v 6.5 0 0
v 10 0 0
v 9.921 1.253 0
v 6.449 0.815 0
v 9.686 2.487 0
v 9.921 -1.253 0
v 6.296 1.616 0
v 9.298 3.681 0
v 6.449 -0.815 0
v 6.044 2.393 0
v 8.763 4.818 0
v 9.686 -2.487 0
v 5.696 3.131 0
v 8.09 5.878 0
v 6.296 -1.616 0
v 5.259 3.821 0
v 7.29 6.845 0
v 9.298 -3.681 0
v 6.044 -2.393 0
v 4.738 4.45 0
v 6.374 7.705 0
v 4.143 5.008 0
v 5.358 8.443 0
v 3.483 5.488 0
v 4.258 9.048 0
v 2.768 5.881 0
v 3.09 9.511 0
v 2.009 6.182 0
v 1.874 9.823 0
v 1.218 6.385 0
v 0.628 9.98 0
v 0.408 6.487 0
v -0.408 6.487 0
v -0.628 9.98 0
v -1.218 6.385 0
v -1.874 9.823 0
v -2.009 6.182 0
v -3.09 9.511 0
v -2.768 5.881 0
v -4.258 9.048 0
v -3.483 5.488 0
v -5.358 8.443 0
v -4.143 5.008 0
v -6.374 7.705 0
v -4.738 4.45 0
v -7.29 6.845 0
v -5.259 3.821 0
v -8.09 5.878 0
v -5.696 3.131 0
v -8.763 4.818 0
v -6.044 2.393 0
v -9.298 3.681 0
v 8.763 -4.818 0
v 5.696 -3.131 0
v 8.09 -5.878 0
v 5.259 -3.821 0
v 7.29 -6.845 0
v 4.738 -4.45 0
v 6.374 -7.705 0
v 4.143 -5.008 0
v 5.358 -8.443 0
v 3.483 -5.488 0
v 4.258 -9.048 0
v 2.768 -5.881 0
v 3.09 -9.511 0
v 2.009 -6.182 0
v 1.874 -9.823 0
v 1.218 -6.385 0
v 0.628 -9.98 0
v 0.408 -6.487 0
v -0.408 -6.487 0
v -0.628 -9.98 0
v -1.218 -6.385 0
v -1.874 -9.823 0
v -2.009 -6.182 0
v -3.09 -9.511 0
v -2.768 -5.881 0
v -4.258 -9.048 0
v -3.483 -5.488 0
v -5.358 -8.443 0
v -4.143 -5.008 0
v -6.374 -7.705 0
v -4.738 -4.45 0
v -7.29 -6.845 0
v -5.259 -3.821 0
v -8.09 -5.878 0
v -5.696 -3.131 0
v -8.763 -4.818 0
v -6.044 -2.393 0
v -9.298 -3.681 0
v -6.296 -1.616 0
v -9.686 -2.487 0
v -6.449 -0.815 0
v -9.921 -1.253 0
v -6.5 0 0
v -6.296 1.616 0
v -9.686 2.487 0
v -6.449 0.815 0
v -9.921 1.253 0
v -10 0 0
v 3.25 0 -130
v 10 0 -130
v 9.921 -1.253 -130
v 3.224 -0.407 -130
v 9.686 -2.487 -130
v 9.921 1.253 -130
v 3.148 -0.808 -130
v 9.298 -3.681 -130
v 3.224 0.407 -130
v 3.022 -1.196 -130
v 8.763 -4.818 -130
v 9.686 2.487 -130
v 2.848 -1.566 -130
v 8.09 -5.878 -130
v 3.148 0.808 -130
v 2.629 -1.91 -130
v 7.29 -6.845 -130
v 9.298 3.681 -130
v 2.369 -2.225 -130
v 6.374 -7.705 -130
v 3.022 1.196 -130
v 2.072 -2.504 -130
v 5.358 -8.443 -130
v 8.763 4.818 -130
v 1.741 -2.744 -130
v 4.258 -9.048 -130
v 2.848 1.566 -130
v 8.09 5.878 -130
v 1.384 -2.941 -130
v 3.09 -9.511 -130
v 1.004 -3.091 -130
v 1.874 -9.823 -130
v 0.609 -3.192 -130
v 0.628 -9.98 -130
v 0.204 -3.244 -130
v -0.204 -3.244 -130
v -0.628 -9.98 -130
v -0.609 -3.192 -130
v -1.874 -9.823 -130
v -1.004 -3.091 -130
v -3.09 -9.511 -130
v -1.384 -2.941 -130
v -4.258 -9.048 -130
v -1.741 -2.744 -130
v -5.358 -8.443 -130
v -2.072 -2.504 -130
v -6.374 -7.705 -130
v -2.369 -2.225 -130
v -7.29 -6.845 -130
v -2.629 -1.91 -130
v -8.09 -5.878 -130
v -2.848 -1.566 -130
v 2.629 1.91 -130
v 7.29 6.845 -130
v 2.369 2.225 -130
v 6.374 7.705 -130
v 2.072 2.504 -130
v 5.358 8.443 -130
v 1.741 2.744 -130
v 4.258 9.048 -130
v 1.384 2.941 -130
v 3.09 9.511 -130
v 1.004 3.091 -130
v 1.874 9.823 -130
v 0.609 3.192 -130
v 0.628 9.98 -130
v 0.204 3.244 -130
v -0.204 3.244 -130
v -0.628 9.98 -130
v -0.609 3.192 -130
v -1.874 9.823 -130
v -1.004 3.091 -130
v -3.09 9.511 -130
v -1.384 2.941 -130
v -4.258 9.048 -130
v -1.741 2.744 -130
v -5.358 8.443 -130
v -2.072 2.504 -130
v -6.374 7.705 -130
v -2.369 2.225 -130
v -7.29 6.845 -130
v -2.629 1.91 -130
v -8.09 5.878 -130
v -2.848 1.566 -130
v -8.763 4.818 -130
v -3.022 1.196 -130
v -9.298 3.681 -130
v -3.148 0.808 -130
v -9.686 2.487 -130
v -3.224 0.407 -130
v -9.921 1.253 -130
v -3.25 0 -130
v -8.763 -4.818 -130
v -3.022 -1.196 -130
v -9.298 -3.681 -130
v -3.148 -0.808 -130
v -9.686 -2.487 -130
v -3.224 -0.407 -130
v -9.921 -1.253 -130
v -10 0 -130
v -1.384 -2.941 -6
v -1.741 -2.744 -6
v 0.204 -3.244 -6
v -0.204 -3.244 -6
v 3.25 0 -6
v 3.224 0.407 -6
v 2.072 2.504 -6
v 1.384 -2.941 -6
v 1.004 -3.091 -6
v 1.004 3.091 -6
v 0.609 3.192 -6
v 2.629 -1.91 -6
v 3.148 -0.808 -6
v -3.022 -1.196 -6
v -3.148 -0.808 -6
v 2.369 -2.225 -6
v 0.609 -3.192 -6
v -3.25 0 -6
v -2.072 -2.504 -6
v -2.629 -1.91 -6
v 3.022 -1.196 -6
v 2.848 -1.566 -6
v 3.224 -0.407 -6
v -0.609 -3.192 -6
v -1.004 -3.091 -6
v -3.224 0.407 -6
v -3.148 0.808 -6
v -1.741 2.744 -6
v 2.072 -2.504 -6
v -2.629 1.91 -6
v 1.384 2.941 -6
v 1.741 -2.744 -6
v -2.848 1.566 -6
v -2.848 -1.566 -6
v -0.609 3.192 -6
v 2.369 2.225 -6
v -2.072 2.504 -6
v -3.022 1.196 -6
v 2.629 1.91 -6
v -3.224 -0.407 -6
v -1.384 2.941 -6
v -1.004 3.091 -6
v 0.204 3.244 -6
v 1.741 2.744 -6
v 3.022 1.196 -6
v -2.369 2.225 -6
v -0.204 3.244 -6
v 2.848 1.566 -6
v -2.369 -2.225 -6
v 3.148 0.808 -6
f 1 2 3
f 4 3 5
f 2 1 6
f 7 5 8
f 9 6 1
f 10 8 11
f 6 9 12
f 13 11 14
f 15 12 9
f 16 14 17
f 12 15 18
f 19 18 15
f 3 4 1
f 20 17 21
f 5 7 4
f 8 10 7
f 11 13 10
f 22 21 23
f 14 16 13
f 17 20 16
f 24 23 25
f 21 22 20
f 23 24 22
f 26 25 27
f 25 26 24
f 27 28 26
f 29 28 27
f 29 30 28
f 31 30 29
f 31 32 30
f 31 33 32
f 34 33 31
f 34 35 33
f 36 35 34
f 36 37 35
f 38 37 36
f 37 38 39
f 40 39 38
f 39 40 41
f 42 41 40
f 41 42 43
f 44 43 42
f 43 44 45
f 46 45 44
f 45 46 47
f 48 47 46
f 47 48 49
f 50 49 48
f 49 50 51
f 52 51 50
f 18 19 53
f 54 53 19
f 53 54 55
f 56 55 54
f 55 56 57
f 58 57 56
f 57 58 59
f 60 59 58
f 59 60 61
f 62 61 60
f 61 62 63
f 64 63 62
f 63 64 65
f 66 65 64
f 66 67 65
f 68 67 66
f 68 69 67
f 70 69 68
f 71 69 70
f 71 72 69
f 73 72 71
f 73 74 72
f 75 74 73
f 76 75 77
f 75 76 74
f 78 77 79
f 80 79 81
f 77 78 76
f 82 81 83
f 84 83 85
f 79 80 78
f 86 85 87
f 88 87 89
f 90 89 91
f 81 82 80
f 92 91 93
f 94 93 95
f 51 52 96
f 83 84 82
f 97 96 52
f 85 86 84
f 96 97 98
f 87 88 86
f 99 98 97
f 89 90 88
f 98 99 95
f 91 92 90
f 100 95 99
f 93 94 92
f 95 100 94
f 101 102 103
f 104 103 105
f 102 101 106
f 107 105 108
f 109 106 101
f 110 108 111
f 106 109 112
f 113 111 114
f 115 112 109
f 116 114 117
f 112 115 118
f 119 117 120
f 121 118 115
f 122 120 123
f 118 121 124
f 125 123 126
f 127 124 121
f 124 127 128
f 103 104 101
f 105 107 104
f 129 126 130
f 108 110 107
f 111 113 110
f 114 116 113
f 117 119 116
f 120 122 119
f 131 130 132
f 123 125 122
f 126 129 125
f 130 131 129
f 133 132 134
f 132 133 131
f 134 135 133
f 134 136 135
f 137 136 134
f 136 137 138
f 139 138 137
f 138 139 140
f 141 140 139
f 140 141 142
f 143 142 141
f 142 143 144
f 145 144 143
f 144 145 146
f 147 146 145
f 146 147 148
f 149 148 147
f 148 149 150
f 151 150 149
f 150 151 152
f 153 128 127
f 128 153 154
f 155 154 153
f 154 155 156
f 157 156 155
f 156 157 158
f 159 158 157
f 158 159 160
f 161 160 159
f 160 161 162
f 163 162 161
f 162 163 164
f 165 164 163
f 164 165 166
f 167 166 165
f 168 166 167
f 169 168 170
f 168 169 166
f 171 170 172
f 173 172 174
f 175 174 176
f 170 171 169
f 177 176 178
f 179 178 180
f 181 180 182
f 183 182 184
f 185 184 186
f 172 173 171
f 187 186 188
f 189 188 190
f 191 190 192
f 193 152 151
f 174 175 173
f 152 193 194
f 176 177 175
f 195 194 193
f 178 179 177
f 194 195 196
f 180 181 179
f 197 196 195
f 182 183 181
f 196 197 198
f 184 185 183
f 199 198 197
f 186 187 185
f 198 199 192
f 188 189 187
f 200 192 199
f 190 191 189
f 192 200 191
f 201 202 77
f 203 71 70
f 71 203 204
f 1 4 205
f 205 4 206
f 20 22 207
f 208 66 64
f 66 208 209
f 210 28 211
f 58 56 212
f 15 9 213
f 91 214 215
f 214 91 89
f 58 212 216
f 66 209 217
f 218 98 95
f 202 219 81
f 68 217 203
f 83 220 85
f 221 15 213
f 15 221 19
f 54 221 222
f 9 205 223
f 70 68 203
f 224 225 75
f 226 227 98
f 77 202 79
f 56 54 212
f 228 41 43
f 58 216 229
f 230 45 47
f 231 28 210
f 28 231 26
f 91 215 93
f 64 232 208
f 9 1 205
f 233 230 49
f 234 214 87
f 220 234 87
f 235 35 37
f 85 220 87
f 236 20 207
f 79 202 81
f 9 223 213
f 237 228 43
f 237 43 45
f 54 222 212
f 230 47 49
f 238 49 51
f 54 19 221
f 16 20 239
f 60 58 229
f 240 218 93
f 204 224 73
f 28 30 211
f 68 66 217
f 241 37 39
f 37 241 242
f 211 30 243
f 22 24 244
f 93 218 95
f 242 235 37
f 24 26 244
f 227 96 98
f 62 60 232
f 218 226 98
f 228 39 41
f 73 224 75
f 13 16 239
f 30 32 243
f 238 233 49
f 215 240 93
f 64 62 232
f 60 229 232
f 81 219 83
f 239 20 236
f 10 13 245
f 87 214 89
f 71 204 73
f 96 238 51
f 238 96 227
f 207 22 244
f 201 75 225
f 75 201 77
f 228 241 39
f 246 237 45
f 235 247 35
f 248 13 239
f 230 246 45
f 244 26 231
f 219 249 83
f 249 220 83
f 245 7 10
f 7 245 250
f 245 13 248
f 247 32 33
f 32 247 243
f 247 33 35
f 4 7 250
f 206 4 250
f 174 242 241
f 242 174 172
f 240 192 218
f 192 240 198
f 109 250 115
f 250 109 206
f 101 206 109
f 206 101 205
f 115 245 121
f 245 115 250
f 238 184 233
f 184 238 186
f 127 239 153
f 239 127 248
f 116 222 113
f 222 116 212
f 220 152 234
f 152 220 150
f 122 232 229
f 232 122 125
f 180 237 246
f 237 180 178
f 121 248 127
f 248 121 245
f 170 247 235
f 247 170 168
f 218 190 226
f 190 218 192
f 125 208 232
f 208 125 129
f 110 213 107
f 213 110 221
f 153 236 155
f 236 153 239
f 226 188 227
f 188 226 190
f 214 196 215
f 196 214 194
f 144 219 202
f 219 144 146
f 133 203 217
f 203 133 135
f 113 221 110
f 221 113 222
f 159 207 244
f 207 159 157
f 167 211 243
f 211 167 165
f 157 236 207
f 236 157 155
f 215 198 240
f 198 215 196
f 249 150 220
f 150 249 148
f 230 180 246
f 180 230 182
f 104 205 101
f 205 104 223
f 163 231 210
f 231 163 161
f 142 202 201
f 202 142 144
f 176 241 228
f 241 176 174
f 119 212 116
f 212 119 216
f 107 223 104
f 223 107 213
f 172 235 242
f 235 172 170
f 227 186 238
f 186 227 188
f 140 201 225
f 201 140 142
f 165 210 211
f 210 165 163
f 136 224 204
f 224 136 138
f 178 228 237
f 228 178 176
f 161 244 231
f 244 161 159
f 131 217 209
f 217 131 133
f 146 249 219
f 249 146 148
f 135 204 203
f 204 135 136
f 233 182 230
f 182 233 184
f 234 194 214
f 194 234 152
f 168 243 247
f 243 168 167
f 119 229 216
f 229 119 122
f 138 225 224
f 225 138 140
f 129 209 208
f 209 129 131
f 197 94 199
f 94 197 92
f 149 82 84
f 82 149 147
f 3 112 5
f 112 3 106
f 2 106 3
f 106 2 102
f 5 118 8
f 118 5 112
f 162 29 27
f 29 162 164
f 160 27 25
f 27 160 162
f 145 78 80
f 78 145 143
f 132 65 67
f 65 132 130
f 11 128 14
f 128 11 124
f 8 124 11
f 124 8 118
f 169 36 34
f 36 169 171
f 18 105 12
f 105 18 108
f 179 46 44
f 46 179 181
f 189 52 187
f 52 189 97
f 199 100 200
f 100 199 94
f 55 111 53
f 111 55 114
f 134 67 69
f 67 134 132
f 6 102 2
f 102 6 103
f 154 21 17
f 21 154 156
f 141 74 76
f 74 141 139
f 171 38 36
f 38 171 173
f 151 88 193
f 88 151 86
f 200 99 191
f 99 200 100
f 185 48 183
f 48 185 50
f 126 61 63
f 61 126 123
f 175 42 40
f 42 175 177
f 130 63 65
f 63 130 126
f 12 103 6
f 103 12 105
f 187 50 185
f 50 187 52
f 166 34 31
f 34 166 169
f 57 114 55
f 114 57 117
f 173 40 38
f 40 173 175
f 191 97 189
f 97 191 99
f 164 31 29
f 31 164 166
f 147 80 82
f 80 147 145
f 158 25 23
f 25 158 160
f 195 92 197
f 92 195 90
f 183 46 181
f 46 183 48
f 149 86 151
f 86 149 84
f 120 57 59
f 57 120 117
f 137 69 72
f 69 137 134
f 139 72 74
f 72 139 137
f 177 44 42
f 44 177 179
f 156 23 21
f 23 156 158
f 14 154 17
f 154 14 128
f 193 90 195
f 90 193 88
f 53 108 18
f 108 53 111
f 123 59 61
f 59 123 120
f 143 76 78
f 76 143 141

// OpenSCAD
$fn = 50;


difference() {
	union() {
		translate(v = [0, 0, -130.0000000000]) {
			cylinder(h = 130, r = 10.0000000000);
		}
		cylinder(h = 0, r = 16.0000000000);
	}
	union() {
		translate(v = [0, 0, 0]) {
			rotate(a = [0, 0, 0]) {
				difference() {
					union() {
						#translate(v = [0, 0, -130.0000000000]) {
							cylinder(h = 130, r = 2.2500000000);
						}
						#translate(v = [0, 0, -6]) {
							cylinder(h = 6, r1 = 3.2500000000, r2 = 6.5000000000);
						}
						#translate(v = [0, 0, -130.0000000000]) {
							cylinder(h = 130, r = 3.2500000000);
						}
						#translate(v = [0, 0, -130.0000000000]) {
							cylinder(h = 130, r = 2.2500000000);
						}
					}
					union();
				}
			}
		}
	}
}
